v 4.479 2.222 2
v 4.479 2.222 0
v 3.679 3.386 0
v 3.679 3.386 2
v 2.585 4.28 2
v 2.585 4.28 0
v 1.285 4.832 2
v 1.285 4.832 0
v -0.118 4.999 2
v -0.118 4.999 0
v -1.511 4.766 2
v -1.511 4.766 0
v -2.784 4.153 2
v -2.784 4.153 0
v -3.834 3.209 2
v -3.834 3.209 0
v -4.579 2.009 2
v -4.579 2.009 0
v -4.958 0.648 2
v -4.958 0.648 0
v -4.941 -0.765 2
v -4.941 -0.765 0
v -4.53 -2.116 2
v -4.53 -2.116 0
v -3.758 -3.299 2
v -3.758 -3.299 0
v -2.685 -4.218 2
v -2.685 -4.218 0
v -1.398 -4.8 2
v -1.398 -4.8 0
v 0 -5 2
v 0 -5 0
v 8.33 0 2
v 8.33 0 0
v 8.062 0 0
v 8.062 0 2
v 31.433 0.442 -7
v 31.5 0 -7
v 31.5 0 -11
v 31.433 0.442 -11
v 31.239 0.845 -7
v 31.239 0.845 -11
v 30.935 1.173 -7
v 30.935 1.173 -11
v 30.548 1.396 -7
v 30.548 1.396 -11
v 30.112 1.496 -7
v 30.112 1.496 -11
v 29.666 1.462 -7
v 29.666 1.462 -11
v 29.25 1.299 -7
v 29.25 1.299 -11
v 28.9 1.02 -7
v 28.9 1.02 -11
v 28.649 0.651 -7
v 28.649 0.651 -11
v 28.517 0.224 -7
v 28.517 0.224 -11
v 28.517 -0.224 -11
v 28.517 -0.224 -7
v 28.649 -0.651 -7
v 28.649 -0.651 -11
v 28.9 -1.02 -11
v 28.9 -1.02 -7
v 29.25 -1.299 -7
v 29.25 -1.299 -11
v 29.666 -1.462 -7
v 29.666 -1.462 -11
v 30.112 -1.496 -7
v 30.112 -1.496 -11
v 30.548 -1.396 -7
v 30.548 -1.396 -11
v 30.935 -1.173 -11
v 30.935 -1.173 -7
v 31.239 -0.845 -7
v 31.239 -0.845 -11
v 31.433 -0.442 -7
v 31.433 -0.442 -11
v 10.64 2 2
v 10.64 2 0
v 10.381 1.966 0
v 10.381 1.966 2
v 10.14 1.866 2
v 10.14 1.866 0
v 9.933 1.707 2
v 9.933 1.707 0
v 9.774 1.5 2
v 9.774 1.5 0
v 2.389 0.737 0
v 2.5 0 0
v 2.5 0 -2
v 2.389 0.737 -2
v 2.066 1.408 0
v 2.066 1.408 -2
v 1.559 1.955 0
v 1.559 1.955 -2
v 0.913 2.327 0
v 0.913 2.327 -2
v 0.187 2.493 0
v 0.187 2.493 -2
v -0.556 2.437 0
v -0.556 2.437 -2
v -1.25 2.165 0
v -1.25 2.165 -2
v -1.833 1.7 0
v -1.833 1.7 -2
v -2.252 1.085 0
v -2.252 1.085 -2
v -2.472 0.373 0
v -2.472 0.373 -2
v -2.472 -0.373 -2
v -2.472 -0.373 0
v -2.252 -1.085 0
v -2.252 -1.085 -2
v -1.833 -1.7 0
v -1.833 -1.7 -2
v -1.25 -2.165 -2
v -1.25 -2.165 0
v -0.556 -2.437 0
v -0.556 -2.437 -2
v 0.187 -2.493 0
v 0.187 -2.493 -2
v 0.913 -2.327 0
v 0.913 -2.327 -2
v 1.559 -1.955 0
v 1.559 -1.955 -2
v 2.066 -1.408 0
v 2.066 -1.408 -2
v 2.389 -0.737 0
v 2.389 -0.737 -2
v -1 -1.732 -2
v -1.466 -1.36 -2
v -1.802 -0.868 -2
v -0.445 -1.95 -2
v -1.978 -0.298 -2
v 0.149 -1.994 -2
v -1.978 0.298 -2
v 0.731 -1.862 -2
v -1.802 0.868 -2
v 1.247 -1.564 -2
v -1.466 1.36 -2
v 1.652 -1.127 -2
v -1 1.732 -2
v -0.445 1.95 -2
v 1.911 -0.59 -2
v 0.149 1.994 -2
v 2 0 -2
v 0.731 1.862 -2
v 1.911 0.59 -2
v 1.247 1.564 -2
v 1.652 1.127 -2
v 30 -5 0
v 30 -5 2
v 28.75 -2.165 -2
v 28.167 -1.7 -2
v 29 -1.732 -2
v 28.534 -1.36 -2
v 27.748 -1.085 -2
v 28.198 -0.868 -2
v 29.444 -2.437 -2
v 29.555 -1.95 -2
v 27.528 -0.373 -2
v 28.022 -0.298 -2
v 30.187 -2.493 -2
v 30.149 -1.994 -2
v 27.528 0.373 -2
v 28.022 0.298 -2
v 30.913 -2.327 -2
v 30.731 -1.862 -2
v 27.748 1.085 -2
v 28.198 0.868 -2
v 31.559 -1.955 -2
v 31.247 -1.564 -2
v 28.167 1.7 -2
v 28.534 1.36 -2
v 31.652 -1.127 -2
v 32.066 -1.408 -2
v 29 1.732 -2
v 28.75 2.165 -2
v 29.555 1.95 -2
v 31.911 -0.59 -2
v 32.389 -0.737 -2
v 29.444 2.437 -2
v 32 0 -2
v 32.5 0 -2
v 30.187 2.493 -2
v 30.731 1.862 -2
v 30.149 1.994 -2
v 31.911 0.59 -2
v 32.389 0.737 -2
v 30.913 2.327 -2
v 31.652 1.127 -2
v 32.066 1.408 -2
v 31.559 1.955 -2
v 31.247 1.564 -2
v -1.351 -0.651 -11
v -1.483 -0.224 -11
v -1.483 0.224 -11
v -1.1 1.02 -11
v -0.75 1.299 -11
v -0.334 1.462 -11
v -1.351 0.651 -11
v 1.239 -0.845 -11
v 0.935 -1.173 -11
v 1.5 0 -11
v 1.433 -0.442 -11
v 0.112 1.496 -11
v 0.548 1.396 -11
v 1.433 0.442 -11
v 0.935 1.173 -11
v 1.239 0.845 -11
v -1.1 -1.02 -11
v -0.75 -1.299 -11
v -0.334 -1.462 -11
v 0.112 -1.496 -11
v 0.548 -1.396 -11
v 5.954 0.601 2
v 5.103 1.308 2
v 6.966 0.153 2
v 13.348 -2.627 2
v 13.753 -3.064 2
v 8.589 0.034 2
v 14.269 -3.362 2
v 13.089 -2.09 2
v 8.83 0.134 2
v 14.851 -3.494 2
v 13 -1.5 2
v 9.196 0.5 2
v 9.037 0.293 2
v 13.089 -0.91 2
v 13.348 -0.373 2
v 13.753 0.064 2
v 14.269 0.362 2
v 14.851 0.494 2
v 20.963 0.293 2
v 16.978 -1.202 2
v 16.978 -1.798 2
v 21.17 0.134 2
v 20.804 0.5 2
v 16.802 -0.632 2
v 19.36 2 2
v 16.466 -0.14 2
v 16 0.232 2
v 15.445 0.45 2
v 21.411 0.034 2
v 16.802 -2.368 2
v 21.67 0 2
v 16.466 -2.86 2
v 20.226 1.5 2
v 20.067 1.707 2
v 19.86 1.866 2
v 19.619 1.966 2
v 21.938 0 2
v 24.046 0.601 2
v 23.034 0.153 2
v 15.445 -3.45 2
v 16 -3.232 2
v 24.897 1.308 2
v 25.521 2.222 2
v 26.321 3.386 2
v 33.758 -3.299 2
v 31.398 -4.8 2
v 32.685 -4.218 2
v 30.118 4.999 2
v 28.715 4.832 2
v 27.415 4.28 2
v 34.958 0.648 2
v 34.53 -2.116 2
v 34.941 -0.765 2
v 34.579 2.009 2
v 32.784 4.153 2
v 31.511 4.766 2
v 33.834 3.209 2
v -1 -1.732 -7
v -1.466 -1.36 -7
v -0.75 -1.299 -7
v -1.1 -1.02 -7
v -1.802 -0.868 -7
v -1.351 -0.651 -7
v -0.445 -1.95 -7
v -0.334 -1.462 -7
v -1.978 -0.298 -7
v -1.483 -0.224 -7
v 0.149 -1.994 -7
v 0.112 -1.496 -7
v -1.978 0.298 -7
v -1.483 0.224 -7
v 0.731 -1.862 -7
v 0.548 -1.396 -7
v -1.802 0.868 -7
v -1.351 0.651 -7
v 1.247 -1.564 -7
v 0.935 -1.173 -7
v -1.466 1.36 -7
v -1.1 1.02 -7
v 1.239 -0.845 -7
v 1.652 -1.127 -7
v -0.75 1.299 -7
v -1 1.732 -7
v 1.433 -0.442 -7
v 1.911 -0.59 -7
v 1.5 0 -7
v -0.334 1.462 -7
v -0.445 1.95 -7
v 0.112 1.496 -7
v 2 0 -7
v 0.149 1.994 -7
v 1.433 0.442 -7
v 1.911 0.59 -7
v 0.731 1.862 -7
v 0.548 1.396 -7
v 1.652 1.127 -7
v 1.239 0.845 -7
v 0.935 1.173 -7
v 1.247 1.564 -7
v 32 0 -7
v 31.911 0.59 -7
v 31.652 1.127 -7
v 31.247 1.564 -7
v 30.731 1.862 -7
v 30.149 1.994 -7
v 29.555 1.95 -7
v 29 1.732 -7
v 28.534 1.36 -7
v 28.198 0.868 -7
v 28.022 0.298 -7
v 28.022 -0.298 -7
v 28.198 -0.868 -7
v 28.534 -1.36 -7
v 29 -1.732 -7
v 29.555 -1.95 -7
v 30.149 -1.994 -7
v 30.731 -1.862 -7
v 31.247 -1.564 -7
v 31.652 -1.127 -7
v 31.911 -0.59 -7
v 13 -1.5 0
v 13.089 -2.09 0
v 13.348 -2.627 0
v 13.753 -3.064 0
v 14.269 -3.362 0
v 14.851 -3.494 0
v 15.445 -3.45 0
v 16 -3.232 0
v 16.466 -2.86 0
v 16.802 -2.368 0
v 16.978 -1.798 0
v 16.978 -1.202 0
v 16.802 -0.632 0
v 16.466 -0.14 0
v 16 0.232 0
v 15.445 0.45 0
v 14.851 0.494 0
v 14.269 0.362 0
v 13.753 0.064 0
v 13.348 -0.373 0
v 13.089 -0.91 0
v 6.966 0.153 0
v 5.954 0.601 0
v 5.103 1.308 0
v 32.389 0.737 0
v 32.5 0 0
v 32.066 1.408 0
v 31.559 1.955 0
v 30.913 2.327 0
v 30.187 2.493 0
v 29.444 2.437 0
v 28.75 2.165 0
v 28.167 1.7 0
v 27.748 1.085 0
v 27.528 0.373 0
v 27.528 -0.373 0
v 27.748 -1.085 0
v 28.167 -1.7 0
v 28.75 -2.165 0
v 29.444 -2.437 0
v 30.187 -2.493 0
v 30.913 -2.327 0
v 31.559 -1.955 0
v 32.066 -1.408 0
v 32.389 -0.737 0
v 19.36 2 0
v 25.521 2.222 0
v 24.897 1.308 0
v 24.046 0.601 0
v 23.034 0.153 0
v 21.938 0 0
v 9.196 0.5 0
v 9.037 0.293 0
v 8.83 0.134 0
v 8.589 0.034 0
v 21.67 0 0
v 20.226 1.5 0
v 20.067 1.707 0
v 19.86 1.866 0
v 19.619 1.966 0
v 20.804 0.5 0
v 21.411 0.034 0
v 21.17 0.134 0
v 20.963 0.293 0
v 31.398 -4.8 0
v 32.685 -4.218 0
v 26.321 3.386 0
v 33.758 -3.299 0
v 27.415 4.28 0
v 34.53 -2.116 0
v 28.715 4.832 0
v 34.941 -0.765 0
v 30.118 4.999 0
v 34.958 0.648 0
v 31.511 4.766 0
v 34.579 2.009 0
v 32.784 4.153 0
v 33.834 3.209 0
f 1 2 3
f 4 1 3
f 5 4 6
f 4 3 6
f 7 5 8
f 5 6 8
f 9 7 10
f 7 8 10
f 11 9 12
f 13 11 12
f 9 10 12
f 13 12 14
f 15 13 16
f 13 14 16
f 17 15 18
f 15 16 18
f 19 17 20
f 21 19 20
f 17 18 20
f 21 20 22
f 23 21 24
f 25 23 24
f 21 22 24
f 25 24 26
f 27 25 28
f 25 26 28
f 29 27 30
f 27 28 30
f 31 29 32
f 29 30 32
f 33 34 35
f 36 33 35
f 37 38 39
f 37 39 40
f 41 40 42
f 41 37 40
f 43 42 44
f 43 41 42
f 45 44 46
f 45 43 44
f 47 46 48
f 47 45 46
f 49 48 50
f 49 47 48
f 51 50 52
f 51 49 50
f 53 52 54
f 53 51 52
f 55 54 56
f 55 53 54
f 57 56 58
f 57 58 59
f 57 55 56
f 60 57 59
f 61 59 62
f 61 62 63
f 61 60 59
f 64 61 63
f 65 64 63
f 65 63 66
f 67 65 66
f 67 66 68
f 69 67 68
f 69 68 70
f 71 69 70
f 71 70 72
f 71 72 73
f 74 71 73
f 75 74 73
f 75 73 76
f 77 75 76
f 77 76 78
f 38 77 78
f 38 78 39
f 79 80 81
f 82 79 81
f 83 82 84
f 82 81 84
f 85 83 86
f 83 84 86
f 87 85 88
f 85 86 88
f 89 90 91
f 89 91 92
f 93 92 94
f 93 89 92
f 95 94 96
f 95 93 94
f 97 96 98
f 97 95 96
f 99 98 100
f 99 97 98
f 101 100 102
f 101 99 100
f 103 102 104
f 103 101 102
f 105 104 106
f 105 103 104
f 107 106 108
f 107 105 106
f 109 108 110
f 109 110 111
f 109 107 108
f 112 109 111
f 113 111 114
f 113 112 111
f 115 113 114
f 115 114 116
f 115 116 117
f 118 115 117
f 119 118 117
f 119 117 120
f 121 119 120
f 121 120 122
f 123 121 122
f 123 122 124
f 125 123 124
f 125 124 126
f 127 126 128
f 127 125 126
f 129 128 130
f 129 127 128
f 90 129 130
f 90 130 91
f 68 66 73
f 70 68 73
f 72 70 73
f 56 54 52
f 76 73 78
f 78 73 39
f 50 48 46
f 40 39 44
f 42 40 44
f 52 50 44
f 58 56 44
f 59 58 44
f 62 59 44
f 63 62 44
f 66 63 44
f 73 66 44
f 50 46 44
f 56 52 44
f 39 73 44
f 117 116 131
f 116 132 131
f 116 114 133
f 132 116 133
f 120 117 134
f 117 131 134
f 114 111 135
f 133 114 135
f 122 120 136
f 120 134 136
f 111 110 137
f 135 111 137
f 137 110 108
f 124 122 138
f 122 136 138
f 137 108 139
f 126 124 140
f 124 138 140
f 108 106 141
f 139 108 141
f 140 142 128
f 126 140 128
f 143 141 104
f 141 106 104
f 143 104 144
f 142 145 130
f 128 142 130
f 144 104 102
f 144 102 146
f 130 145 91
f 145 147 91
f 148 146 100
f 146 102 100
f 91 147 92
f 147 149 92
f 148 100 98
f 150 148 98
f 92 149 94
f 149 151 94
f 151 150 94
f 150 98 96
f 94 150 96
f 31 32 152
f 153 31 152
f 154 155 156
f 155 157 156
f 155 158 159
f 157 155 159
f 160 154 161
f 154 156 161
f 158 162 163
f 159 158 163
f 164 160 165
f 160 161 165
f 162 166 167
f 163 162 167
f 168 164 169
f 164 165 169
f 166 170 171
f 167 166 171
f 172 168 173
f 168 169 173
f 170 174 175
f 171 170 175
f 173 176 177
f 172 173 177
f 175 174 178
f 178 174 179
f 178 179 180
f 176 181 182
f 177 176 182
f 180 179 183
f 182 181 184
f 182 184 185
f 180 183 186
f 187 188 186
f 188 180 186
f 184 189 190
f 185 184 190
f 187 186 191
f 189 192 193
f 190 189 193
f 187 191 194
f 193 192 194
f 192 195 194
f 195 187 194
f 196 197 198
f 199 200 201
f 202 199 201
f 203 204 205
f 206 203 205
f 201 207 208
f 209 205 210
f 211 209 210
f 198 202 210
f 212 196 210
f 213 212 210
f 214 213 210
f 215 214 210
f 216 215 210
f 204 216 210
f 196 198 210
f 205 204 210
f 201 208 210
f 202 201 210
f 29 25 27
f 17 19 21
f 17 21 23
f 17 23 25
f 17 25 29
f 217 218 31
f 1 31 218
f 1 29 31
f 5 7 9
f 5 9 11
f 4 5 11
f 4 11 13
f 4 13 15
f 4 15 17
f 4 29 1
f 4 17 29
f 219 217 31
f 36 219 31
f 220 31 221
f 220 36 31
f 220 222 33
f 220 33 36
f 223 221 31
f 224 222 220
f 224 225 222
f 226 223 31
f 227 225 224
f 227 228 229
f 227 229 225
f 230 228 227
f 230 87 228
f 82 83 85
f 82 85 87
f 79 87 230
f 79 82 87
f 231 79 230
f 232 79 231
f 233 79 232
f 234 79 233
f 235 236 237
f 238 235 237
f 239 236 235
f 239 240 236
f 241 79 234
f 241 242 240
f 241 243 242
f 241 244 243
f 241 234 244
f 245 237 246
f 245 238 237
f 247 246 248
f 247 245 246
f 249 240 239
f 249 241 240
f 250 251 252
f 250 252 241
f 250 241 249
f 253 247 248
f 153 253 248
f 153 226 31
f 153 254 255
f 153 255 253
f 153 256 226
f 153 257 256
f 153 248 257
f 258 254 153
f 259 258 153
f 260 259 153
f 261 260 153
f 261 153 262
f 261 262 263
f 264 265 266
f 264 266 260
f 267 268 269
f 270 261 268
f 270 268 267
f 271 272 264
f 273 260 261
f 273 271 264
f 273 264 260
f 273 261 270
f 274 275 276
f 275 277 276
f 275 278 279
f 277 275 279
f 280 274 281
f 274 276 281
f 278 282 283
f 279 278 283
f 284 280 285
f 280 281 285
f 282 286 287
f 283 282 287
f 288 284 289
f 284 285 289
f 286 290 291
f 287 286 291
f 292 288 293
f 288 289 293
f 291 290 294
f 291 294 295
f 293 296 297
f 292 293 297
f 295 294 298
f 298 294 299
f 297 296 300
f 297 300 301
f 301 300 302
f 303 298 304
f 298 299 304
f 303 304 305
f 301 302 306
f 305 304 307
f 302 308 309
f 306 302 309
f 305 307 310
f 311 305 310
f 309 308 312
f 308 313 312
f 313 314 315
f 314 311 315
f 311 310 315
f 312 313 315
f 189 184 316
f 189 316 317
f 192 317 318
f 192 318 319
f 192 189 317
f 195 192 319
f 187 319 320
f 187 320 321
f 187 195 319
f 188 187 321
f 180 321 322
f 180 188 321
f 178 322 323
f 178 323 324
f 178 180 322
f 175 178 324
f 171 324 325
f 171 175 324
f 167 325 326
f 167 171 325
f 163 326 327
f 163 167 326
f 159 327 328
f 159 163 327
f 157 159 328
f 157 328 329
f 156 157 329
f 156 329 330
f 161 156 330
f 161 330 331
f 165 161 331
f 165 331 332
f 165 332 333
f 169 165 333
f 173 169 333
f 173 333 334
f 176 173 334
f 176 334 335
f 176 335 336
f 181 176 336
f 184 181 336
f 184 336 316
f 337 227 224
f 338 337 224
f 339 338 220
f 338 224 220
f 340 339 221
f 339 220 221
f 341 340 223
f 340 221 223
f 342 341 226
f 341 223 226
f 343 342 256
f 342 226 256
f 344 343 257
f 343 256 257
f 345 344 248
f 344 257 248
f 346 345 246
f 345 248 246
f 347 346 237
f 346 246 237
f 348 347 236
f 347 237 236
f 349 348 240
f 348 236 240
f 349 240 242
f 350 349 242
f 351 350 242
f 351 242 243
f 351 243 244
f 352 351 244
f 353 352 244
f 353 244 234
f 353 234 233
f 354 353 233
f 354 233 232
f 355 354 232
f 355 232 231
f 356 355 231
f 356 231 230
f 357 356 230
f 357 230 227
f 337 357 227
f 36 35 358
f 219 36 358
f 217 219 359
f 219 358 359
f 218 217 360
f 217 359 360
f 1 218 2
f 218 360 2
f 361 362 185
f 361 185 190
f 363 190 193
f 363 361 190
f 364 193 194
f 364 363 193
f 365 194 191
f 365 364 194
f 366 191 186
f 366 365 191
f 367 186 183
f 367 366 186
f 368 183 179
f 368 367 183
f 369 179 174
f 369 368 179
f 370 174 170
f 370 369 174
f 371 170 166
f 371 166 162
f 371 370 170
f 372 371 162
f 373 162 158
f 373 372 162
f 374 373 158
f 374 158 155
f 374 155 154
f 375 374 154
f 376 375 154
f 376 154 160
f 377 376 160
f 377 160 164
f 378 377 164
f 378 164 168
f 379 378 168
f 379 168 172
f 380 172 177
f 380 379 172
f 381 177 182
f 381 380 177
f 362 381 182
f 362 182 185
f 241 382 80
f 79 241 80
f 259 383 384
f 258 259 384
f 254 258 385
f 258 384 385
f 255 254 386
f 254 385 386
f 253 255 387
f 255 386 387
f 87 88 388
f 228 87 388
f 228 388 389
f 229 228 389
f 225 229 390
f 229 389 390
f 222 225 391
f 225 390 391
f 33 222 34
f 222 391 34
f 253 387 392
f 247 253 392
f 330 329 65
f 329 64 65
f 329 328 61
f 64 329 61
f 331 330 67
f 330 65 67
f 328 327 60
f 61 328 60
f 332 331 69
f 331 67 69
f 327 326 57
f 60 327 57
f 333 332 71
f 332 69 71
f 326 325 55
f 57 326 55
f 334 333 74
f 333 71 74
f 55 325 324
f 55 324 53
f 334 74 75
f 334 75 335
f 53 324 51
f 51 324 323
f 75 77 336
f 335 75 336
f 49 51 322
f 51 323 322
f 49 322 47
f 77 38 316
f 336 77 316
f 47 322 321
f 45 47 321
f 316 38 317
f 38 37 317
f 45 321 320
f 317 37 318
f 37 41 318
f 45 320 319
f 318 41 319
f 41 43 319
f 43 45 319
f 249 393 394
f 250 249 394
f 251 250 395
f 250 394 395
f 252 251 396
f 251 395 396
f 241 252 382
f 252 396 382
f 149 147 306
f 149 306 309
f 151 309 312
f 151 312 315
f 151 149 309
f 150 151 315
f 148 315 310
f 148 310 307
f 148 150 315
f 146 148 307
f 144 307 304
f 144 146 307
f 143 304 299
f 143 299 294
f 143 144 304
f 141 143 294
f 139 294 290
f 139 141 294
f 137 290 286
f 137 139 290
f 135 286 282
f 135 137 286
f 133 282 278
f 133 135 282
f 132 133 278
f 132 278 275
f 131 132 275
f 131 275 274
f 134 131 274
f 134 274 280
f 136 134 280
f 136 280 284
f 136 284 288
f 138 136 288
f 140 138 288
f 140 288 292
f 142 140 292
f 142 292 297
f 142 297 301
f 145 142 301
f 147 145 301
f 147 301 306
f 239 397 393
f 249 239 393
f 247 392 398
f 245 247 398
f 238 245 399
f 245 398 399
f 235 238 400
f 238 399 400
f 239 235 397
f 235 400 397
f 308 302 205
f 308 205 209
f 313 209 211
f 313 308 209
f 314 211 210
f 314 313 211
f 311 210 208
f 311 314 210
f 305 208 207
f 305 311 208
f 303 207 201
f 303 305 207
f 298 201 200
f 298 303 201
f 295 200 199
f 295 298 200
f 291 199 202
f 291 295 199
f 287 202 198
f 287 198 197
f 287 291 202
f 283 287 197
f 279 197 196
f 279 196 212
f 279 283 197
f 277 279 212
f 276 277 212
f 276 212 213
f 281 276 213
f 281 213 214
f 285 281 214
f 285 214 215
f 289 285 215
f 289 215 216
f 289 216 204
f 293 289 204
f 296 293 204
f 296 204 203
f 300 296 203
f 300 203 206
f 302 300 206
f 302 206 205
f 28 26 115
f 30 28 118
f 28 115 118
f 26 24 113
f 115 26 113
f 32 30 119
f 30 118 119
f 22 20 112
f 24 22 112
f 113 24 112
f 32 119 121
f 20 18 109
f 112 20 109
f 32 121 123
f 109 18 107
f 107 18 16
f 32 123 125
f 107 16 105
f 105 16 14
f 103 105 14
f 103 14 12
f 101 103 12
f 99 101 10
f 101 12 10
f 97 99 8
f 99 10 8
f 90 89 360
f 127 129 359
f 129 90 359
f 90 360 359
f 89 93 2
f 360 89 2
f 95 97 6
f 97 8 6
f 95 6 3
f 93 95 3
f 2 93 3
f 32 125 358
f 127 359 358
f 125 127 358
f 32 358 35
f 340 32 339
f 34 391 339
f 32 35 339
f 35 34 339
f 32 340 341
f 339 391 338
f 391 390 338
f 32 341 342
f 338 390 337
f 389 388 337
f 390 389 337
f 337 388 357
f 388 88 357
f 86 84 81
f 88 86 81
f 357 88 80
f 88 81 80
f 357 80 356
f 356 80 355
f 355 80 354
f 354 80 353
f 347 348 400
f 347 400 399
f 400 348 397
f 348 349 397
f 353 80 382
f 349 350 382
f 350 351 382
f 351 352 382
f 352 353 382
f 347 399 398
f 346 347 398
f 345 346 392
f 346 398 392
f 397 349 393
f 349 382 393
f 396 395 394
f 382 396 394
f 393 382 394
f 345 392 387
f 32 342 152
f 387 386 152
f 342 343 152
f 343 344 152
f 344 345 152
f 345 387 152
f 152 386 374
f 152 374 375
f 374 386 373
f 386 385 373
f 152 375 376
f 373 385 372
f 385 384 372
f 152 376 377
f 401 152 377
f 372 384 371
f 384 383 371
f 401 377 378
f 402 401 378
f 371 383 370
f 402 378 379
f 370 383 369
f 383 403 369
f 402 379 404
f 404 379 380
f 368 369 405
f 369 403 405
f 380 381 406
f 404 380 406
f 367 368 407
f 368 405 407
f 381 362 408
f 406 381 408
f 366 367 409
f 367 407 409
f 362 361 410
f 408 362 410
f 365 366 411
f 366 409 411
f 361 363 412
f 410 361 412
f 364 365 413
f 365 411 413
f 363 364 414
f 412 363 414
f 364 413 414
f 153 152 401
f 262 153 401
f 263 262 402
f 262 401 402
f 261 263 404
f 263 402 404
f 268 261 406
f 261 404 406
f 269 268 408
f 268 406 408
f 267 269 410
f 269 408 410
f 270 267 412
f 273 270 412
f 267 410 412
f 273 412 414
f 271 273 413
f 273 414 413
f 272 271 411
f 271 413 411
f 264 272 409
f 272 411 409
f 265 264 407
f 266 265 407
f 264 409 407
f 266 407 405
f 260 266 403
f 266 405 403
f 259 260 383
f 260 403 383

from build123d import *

# Parameters (mm, degrees)
F1_DEPTH = 2
F2_R     = 2.5
F3_DEPTH = 2
F4_R     = 2
F5_DEPTH = 7
F6_R     = 1.5
F7_DEPTH = 11
F8_D     = 4


# Not quite as in the source:
# - a feature names something its author has since deleted; it is built from what else it names


with BuildPart() as f1:
    # F0 (on Top) → F1 (new body)
    with BuildSketch(Plane.XY):
        with BuildLine():
            ThreePointArc((4.4790320824, 2.2222222222), (-4.249182928, 2.6352313835), (0, -5))
            Line((0, -5), (30, -5))
            ThreePointArc((30, -5), (34.249182928, 2.6352313835), (25.5209679176, 2.2222222222))
            ThreePointArc((25.5209679176, 2.2222222222), (24.0459273585, 0.6006536576), (21.9377422517, 0))
            Line((21.9377422517, 0), (21.6697930593, 0))
            ThreePointArc((21.6697930593, 0), (21.1697930593, 0.1339745962), (20.8037676555, 0.5))
            Line((20.8037676555, 0.5), (20.2264173863, 1.5))
            ThreePointArc((20.2264173863, 1.5), (19.8603919825, 1.8660254038), (19.3603919825, 2))
            Line((19.3603919825, 2), (10.6396080175, 2))
            ThreePointArc((10.6396080175, 2), (10.1396080175, 1.8660254038), (9.7735826137, 1.5))
            Line((9.7735826137, 1.5), (9.1962323445, 0.5))
            ThreePointArc((9.1962323445, 0.5), (8.8302069407, 0.1339745962), (8.3302069407, 0))
            Line((8.3302069407, 0), (8.0622577483, 0))
            ThreePointArc((8.0622577483, 0), (5.9540726415, 0.6006536576), (4.4790320824, 2.2222222222))
        make_face()
    extrude(amount=F1_DEPTH)

    # F2 (on Top) → F3 (join)
    with BuildSketch(Plane.XY):
        Circle(F2_R)
        with Locations((30, 0)):
            Circle(F2_R)
    extrude(amount=-F3_DEPTH)

    # F4 (on Top) → F5 (join)
    with BuildSketch(Plane.XY):
        Circle(F4_R)
        with Locations((30, 0)):
            Circle(F4_R)
    extrude(amount=-F5_DEPTH)

    # F6 (on Top) → F7 (join)
    with BuildSketch(Plane.XY):
        Circle(F6_R)
        with Locations((30, 0)):
            Circle(F6_R)
    extrude(amount=-F7_DEPTH)

    # F8 (through all)
    with Locations(Plane(origin=(0, 0, 0), x_dir=(1, 0, 0), z_dir=(0, 0, -1))):
        with Locations((15, 1.5)):
            Hole(F8_D / 2)


solid = f1.part
